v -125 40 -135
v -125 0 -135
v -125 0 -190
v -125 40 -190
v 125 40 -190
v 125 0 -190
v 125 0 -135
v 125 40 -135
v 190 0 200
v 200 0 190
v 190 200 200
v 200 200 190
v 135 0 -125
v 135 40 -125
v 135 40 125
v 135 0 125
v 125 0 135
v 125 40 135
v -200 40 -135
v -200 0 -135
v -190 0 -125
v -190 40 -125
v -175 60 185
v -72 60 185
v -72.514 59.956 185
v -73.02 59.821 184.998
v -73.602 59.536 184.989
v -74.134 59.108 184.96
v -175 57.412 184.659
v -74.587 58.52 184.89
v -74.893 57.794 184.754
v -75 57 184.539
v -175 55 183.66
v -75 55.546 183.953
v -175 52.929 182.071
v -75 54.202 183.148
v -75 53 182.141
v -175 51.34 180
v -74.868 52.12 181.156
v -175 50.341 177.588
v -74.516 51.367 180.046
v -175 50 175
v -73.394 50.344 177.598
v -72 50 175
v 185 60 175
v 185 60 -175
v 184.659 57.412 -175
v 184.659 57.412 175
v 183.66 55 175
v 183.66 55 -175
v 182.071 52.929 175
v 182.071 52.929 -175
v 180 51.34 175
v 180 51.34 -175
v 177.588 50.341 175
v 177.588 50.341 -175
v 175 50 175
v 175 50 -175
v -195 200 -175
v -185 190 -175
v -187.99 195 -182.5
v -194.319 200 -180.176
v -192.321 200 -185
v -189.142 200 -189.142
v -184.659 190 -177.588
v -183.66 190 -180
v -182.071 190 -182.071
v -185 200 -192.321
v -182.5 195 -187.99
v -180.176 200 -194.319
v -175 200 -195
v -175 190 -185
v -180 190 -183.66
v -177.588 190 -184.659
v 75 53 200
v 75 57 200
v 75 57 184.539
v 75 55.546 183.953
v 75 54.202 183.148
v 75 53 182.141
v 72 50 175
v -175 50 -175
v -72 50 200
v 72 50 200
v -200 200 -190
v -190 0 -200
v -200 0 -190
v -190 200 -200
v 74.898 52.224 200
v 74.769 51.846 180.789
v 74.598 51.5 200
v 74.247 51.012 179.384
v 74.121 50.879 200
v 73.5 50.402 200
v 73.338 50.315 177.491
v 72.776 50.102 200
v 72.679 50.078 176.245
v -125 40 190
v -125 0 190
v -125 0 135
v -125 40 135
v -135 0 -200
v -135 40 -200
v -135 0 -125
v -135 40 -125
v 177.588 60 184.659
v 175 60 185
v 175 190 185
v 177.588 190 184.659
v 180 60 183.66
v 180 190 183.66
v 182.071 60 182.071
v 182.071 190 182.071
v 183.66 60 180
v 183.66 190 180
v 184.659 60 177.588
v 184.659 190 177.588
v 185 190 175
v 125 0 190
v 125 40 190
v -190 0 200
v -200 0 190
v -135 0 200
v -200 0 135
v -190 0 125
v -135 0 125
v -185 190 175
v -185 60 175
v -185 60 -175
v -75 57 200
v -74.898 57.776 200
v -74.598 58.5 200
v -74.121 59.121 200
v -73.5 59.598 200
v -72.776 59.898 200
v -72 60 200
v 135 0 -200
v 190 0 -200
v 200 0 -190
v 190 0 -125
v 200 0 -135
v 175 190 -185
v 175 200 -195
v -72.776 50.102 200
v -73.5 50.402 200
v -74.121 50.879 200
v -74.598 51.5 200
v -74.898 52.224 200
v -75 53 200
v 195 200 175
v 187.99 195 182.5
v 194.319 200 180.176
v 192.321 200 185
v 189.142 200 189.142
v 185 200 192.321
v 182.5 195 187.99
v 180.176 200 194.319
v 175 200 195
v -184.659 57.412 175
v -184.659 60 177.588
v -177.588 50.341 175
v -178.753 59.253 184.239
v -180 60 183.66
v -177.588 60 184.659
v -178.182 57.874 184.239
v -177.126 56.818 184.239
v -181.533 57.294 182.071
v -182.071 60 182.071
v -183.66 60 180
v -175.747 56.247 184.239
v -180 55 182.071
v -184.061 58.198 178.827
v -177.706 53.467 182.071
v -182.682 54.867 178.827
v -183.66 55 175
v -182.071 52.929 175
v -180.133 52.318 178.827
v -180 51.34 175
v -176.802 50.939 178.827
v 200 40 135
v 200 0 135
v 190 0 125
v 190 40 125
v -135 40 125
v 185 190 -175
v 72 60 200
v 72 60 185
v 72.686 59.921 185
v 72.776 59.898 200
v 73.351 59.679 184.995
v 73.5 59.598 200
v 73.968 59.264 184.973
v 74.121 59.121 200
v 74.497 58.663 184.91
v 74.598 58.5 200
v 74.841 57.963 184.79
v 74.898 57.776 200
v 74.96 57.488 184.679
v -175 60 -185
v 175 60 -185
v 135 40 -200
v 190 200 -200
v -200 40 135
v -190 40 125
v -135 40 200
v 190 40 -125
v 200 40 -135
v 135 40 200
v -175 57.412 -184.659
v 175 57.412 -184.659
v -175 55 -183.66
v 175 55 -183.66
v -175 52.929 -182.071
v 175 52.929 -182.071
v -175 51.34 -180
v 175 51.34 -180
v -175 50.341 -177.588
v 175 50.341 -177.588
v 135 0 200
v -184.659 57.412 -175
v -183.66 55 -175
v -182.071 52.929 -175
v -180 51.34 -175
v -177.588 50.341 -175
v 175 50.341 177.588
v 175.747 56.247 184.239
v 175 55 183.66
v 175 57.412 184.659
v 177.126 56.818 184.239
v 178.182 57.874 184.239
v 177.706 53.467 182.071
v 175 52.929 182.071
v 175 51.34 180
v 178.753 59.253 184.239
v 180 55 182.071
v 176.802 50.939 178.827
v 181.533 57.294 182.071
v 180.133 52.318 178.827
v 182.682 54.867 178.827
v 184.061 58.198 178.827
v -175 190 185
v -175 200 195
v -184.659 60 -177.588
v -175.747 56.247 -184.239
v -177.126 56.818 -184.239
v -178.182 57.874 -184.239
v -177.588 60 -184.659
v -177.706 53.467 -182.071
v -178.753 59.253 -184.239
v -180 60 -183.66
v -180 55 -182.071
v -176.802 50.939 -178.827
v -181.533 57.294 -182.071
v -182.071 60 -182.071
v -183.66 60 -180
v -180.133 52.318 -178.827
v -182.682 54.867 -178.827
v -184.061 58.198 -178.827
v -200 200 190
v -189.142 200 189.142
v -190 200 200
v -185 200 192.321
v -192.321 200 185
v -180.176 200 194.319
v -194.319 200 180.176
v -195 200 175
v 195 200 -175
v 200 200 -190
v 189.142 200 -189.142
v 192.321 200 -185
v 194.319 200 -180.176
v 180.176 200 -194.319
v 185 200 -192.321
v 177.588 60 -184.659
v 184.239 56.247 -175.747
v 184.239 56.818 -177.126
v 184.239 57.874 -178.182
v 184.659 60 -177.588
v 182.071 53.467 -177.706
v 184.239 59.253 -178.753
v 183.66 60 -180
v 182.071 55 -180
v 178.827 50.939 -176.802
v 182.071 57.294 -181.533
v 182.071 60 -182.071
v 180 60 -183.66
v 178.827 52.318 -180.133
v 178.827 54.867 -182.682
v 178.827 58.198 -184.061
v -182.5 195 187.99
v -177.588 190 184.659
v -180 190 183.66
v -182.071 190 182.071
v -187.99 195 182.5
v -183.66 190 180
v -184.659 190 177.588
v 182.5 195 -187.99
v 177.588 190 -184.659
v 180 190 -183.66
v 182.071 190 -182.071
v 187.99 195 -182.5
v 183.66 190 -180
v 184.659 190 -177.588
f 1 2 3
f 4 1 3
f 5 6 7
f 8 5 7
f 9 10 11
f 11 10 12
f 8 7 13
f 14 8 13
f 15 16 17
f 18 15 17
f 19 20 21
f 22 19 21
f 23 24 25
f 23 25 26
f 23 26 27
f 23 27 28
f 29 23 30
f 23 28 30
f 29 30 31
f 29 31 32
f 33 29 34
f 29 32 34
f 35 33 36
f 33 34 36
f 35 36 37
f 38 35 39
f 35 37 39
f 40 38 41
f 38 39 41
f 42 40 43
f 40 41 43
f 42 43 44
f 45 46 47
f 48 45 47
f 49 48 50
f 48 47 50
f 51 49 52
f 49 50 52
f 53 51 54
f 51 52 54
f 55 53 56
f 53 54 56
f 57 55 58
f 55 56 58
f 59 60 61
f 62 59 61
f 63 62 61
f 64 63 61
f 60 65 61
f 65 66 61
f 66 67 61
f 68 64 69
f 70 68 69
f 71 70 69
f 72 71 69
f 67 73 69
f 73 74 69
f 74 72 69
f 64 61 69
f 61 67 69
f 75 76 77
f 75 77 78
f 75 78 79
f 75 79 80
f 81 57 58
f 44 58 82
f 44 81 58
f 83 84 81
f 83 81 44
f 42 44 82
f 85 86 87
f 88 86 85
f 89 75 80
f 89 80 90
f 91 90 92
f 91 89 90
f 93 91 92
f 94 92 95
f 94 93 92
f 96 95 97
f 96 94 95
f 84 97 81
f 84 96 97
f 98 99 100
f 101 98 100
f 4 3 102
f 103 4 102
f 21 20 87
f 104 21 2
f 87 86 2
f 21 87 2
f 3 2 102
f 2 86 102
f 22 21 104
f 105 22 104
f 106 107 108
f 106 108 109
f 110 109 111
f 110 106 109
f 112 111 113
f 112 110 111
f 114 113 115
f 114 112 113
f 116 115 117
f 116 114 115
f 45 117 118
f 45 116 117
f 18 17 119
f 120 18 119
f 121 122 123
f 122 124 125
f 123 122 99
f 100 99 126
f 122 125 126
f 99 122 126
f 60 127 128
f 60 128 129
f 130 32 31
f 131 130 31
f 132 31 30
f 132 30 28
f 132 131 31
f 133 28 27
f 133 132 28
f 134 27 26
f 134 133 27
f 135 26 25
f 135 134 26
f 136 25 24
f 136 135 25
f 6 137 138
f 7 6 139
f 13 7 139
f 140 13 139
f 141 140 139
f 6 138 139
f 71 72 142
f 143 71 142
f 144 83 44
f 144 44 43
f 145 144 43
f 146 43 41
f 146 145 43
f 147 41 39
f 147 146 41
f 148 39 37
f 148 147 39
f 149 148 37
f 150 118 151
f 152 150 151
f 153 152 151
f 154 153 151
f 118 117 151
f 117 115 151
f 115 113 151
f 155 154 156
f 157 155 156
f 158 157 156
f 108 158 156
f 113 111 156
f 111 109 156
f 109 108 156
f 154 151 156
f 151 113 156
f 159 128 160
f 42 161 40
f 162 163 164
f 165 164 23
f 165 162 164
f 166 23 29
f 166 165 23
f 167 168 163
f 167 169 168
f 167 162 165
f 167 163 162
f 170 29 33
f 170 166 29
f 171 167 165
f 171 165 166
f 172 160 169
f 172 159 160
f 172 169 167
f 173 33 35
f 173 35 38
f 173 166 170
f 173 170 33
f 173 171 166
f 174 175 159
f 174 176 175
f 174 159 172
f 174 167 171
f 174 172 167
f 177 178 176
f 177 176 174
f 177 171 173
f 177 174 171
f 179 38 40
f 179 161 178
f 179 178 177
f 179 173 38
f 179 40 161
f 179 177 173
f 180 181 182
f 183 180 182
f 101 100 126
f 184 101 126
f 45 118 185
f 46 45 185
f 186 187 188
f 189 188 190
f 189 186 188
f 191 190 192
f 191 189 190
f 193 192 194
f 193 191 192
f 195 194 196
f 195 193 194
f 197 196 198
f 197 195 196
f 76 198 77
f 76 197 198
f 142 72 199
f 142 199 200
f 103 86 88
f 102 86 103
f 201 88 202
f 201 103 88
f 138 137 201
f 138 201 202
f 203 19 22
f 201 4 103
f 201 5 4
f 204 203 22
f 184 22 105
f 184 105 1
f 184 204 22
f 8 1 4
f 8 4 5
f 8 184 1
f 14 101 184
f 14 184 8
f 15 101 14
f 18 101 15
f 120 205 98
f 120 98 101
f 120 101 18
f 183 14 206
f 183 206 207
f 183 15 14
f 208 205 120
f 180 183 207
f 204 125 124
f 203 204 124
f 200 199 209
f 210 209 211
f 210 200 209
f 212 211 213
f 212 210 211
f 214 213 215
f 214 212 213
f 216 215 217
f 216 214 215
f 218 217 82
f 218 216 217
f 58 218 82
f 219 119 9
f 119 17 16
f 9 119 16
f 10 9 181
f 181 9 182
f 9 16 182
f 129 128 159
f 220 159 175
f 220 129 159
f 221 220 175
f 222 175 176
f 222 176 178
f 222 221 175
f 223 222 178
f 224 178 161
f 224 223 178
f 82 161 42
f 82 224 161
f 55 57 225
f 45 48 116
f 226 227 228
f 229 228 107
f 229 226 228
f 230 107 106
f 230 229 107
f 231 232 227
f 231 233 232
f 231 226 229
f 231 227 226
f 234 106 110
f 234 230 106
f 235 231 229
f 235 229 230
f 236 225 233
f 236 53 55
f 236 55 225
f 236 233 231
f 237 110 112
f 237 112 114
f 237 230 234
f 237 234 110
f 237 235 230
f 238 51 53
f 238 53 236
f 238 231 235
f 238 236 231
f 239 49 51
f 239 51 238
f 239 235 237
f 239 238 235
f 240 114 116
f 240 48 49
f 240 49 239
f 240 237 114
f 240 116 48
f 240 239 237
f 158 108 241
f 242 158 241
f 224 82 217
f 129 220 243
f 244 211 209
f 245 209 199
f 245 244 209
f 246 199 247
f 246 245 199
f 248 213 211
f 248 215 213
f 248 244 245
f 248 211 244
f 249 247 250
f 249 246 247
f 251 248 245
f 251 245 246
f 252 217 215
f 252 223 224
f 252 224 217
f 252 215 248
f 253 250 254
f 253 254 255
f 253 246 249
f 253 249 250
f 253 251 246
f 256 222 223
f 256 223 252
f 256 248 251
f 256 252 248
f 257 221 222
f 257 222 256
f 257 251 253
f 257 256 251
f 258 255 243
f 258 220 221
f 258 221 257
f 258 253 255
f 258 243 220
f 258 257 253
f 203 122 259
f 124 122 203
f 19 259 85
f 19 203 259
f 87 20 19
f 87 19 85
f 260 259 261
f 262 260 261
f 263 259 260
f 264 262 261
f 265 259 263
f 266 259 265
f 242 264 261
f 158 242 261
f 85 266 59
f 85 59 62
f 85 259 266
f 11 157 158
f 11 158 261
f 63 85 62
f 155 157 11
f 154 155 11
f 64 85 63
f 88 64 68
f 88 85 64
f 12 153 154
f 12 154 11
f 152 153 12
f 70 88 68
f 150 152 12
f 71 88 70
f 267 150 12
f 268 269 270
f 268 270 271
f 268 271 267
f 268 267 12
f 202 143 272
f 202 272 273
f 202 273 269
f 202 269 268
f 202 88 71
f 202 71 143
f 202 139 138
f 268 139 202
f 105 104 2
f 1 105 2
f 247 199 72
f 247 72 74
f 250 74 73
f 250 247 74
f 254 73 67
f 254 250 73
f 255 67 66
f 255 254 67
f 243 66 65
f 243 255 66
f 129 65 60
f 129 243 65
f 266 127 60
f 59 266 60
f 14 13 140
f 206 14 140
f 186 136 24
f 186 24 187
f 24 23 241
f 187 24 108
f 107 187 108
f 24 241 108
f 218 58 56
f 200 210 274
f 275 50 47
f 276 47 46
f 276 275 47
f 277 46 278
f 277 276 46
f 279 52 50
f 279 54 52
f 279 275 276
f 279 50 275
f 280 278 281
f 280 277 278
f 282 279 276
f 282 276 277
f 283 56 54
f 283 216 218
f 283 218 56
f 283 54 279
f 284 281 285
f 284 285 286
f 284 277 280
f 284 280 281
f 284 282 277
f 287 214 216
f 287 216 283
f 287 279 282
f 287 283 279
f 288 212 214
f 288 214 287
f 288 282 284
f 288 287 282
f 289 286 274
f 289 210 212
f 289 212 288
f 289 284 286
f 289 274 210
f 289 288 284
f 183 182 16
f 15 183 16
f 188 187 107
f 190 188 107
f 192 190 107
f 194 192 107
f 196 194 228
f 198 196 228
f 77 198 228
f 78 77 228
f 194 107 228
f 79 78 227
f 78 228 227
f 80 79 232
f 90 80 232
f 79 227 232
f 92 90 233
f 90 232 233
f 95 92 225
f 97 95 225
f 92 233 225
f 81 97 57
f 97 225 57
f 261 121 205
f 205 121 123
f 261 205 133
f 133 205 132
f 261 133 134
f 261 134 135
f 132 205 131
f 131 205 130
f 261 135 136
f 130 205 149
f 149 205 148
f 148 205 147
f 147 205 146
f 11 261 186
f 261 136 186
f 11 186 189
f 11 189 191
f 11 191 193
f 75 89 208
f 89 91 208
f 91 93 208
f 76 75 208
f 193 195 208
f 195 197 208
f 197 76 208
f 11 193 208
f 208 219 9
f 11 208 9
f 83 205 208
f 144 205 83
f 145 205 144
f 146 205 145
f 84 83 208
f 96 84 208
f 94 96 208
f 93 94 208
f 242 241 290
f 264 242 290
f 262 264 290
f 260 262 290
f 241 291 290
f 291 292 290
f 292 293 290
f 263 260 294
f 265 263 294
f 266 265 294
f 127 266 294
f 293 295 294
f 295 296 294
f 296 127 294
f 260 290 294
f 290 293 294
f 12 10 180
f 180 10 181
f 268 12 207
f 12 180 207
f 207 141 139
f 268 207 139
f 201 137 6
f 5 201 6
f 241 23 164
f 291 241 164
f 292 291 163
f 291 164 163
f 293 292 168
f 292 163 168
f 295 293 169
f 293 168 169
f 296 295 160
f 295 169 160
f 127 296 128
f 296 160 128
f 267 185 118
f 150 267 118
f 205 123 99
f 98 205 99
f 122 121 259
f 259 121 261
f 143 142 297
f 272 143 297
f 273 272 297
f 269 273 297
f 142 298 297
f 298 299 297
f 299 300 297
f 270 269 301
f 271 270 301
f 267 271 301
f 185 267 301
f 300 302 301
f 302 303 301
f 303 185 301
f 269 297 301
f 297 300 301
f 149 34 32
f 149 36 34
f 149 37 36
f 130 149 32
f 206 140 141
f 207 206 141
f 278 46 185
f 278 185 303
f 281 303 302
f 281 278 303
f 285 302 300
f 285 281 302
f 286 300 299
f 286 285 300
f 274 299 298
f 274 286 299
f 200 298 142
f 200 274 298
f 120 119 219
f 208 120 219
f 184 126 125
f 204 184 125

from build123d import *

# Parameters (mm, degrees)
SKETCH1_W           = 400
SKETCH1_H           = 400
BOSS_EXTRUDE1_DEPTH = 200
SKETCH2_W           = 370
SKETCH2_H           = 370
CUT_EXTRUDE1_DEPTH  = 150
FILLET1_R           = 10
CHAMFER1_SIZE       = 10
CUT_EXTRUDE2_REACH  = 491.898
CUT_EXTRUDE3_DEPTH  = 40


with BuildPart() as part:
    # Sketch1 → Boss-Extrude1 (new body)
    with BuildSketch(Plane(origin=(0, 0, 0), x_dir=(1, 0, 0), z_dir=(0, 1, 0))):
        Rectangle(SKETCH1_W, SKETCH1_H)
    extrude(amount=BOSS_EXTRUDE1_DEPTH)

    # Sketch2 → Cut-Extrude1 (cut)
    with BuildSketch(Plane(origin=(0, 200, 0), x_dir=(1, 0, 0), z_dir=(0, 1, 0))):
        Rectangle(SKETCH2_W, SKETCH2_H)
    extrude(amount=-CUT_EXTRUDE1_DEPTH, mode=Mode.SUBTRACT)

    # Fillet1
    fillet1_edges = [part.edges().sort_by_distance(p)[0] for p in [
        (-185, 50, 0),
        (-185, 125, 185),
        (0, 50, -185),
        (-185, 125, -185),
        (185, 50, 0),
        (185, 125, -185),
        (0, 50, 185),
        (185, 125, 185),
    ]]
    fillet(fillet1_edges, radius=FILLET1_R)

    # Chamfer1
    chamfer1_edges = [part.edges().sort_by_distance(p)[0] for p in [
        (0, 200, -185),
        (185, 200, 0),
        (0, 200, 185),
        (-185, 200, 0),
        (182.071067812, 200, 182.071067812),
        (-182.071067812, 200, 182.071067812),
        (182.071067812, 200, -182.071067812),
        (-182.071067812, 200, -182.071067812),
        (-200, 100, -200),
        (200, 100, -200),
        (200, 100, 200),
        (-200, 100, 200),
    ]]
    chamfer(chamfer1_edges, length=CHAMFER1_SIZE)

    # Sketch3 → Cut-Extrude2 (cut, up to next)
    with BuildSketch(Plane.XY.offset(200), mode=Mode.PRIVATE) as cut_extrude2_sk1:
        with BuildLine():
            Line((-72, 60), (72, 60))
            ThreePointArc((72, 60), (74.121320344, 59.121320344), (75, 57))
            Line((75, 57), (75, 53))
            ThreePointArc((75, 53), (74.121320344, 50.878679656), (72, 50))
            Line((72, 50), (-72, 50))
            ThreePointArc((-72, 50), (-74.121320344, 50.878679656), (-75, 53))
            Line((-75, 53), (-75, 57))
            ThreePointArc((-75, 57), (-74.121320344, 59.121320344), (-72, 60))
        make_face()
    cut_extrude2_tool1 = extrude(cut_extrude2_sk1.sketch, amount=-CUT_EXTRUDE2_REACH, mode=Mode.PRIVATE) & part.part
    add(cut_extrude2_tool1.solids().sort_by_distance((0, 55, 200))[0], mode=Mode.SUBTRACT)

    # Sketch4 → Cut-Extrude3 (cut)
    with BuildSketch(Plane.XZ):
        Polygon((190, 125), (135, 125), (125, 135), (125, 190), (135, 200), (-135, 200), (-125, 190), (-125, 135), (-135, 125), (-190, 125), (-200, 135), (-200, -135), (-190, -125), (-135, -125), (-125, -135), (-125, -190), (-135, -200), (135, -200), (125, -190), (125, -135), (135, -125), (190, -125), (200, -135), (200, 135), align=None)
    extrude(amount=-CUT_EXTRUDE3_DEPTH, mode=Mode.SUBTRACT)


solid = part.part
